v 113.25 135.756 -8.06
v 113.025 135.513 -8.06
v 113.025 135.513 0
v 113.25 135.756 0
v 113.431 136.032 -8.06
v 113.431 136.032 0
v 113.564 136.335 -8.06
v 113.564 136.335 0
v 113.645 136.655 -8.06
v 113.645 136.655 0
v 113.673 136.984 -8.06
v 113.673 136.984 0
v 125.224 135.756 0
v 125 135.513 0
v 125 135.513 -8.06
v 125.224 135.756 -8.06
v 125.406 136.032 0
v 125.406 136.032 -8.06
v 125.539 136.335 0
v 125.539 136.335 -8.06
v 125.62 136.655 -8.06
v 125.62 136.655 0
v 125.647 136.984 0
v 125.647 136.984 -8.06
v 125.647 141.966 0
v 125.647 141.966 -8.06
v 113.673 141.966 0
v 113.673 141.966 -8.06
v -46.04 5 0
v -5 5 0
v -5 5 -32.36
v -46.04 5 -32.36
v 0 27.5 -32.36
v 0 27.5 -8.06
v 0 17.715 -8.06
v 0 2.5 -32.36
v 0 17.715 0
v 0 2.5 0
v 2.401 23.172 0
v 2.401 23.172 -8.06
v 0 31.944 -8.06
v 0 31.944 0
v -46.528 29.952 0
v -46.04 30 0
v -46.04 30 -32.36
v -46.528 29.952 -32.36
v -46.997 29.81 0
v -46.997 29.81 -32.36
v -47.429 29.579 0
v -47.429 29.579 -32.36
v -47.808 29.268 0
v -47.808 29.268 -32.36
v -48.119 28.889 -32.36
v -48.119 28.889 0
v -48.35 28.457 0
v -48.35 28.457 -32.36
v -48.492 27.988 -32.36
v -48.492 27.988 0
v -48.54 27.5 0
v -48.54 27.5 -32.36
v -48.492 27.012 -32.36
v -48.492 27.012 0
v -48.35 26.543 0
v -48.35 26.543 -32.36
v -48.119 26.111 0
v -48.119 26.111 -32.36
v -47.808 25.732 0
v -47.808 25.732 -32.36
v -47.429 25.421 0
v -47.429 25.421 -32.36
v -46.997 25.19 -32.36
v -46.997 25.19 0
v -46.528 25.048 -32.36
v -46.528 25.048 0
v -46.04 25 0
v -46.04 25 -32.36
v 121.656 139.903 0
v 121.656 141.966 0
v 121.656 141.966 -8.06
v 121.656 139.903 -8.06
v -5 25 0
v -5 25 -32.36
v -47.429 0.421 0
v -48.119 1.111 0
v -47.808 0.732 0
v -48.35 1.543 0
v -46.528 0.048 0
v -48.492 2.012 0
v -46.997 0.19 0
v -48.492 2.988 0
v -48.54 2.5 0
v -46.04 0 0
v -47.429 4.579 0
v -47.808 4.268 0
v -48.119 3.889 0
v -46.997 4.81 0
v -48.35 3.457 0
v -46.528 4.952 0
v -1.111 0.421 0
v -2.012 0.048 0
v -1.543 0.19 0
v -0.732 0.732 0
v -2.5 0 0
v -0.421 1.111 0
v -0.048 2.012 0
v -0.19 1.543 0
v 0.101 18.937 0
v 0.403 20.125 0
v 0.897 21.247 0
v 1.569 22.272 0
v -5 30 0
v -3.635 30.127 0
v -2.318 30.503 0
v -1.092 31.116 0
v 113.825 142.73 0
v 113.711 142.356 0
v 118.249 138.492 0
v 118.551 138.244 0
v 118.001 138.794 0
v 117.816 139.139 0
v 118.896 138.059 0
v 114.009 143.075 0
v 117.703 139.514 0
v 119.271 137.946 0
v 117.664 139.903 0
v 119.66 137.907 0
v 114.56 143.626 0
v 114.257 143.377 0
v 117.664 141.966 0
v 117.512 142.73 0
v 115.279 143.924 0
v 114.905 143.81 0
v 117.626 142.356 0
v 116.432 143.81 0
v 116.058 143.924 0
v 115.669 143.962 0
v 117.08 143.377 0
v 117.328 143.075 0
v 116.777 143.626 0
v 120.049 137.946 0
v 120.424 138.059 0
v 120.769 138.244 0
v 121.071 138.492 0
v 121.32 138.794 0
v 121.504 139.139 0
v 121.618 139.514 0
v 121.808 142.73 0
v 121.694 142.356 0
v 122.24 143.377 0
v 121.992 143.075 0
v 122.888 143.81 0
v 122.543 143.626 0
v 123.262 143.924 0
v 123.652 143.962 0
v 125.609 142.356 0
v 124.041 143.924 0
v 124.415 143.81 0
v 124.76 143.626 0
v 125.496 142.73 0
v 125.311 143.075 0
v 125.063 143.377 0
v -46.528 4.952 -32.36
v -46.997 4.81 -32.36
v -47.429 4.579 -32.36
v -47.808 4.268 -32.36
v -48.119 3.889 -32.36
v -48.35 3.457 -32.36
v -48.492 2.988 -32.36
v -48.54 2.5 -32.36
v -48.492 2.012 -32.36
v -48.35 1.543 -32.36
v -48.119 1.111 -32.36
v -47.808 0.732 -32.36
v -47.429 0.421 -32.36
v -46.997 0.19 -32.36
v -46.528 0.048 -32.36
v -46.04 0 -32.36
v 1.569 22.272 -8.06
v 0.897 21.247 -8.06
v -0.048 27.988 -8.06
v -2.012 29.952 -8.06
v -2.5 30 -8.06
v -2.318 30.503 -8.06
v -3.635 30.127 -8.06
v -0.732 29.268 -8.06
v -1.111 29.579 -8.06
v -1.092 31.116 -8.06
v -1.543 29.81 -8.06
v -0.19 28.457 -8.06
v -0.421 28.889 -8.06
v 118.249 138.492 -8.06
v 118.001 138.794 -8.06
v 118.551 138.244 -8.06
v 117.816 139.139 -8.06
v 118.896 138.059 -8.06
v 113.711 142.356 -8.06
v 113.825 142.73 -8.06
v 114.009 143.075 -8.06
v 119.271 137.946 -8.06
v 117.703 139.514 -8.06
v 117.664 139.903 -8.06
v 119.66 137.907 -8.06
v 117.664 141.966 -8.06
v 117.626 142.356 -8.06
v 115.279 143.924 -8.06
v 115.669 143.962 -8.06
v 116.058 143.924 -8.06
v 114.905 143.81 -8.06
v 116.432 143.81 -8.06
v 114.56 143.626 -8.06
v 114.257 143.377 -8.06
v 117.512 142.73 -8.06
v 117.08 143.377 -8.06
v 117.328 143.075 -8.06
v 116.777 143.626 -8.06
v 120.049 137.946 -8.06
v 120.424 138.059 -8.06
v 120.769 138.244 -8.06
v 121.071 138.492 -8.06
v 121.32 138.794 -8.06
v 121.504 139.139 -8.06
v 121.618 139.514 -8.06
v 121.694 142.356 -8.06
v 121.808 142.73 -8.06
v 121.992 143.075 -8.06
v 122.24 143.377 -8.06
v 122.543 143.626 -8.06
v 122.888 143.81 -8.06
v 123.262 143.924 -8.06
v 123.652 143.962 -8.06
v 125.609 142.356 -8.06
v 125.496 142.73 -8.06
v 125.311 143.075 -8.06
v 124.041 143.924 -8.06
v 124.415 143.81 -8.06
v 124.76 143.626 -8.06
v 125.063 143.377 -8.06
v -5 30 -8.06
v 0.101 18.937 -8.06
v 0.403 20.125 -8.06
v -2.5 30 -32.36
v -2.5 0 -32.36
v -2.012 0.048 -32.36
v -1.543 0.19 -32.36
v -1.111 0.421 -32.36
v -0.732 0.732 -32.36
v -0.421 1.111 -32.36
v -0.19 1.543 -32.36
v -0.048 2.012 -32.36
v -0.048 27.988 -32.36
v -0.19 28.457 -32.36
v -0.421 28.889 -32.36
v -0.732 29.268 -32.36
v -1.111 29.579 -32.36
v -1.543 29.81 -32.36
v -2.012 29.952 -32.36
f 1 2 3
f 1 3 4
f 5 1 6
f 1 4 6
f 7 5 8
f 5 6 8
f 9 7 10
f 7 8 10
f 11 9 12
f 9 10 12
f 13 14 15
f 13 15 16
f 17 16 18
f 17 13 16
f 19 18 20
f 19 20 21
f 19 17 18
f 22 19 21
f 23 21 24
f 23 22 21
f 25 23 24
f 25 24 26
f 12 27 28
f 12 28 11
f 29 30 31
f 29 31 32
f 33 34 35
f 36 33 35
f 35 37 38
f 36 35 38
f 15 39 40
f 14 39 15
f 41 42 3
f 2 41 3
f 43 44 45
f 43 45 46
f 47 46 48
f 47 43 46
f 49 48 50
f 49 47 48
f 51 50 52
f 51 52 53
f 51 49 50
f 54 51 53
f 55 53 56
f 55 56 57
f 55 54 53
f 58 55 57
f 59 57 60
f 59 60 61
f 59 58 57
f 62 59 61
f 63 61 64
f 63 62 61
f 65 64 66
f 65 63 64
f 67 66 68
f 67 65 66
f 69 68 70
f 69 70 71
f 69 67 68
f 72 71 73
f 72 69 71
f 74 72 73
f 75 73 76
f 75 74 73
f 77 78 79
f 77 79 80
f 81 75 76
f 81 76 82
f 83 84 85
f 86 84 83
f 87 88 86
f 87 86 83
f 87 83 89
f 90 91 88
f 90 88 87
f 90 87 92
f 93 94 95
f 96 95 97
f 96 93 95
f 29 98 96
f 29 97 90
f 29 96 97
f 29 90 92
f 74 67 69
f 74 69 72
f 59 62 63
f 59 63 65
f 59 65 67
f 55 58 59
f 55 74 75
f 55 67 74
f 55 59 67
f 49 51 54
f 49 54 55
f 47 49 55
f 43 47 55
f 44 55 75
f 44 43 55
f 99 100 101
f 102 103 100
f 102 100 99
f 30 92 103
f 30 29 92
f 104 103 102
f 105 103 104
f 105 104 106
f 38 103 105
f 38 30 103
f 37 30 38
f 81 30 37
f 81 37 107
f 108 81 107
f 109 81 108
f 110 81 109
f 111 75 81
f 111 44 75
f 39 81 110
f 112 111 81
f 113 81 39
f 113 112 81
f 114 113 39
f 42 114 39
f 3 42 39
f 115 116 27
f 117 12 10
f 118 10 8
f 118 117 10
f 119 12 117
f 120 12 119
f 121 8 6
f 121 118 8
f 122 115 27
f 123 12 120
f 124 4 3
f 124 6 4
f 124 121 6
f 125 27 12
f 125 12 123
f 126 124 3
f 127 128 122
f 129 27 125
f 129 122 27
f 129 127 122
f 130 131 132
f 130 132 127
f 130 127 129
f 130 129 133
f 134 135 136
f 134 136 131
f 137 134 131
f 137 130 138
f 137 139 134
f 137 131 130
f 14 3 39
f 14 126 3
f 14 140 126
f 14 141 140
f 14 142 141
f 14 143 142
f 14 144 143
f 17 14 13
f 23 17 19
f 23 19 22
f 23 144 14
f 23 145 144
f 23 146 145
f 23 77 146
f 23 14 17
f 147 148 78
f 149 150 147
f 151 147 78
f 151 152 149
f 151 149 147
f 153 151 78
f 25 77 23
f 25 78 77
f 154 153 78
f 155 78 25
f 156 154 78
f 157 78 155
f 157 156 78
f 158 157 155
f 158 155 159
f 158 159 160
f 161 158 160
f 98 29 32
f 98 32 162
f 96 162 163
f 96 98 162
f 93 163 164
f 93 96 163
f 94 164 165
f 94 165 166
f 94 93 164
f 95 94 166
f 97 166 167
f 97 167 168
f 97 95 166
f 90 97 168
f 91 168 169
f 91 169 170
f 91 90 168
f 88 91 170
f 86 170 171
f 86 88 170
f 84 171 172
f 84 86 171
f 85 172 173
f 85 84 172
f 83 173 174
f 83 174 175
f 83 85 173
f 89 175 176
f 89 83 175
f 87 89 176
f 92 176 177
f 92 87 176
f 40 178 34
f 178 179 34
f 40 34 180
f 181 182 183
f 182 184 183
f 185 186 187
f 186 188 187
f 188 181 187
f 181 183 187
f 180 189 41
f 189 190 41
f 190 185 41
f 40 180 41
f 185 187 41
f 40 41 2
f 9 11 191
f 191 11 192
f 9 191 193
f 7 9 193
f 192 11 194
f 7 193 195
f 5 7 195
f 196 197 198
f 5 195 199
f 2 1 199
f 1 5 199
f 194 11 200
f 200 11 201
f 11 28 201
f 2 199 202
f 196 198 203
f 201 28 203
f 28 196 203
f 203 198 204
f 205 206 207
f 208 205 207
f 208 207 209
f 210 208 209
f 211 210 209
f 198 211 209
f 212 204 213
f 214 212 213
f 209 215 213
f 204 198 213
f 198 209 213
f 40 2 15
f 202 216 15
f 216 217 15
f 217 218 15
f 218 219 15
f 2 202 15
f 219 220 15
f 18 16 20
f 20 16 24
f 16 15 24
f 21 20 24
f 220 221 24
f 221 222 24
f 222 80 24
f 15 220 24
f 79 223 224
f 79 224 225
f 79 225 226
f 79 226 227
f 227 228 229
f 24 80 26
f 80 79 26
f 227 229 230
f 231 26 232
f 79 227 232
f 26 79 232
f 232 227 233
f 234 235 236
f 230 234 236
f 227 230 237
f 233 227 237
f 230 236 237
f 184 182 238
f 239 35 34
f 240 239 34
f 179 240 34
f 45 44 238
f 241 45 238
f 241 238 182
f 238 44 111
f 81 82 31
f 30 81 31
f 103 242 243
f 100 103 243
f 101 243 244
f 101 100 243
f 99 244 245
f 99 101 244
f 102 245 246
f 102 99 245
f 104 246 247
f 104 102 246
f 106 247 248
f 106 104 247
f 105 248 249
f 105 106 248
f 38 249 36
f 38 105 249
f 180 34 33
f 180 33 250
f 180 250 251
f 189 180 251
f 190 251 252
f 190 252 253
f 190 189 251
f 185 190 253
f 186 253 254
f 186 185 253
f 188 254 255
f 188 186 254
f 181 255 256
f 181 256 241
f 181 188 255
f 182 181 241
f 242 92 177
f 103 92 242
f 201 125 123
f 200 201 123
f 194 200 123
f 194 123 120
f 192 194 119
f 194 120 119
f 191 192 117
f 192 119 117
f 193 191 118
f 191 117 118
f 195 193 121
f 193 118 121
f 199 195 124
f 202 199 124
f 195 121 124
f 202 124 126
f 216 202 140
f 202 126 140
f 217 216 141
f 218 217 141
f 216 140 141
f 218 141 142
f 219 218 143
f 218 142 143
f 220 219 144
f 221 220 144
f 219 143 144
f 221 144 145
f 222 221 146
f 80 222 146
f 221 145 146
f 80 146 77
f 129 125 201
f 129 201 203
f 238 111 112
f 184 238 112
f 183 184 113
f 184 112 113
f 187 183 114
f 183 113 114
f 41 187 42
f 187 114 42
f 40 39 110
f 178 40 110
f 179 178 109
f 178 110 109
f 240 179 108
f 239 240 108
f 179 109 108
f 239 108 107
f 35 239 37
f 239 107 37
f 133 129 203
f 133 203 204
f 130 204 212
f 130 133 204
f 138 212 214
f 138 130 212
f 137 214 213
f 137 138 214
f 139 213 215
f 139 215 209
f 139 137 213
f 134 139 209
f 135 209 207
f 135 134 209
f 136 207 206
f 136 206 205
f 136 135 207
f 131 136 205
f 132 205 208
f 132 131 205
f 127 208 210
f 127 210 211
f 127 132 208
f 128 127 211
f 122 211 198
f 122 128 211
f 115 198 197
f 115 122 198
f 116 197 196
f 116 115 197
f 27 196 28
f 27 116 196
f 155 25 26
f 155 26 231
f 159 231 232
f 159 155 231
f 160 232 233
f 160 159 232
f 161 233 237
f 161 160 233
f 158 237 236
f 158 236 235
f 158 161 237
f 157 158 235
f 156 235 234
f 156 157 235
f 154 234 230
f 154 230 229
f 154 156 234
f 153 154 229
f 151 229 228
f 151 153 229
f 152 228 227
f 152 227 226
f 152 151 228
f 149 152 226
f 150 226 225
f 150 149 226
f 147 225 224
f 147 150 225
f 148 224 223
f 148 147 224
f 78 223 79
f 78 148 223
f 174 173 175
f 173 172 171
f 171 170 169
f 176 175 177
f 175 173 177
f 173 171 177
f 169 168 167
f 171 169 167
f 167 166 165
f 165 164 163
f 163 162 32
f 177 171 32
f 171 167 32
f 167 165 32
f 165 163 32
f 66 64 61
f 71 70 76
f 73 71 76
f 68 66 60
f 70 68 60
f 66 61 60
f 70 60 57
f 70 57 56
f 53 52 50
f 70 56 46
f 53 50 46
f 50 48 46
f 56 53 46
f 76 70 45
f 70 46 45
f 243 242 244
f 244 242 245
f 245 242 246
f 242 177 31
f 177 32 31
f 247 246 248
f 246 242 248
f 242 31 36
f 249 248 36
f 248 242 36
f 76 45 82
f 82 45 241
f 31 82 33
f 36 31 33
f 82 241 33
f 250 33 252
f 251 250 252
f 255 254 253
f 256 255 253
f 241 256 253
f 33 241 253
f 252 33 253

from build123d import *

# Parameters (mm, degrees)
EXTRUDE001_DEPTH = 32.36
EXTRUDE_DEPTH    = 8.06


with BuildPart() as extrude001:
    # Sketch001 → Extrude001 (new body)
    with BuildSketch(Plane.XY):
        with BuildLine():
            Line((-46.04, 25), (-5, 25))
            Line((-5, 25), (-5, 5))
            Line((-5, 5), (-46.04, 5))
            ThreePointArc((-46.04, 5), (-48.54, 2.5), (-46.04, 0))
            Line((-46.04, 0), (-2.5, 0))
            ThreePointArc((-2.5, 0), (-0.732233, 0.732233), (0, 2.5))
            Line((0, 27.5), (0, 2.5))
            ThreePointArc((0, 27.5), (-0.732233, 29.267767), (-2.5, 30))
            Line((-46.04, 30), (-2.5, 30))
            ThreePointArc((-46.04, 30), (-48.54, 27.5), (-46.04, 25))
        make_face()
    extrude(amount=-EXTRUDE001_DEPTH)


with BuildPart() as fusion:
    # Sketch → Extrude (new body)
    with BuildSketch(Plane.XY):
        with BuildLine():
            Line((-46.04, 25), (-5, 25))
            Line((-5, 25), (-5, 5))
            Line((-5, 5), (-46.04, 5))
            ThreePointArc((-46.04, 5), (-48.54, 2.5), (-46.04, 0))
            Line((-46.04, 0), (-2.5, 0))
            ThreePointArc((-2.5, 0), (-0.732233, 0.732233), (0, 2.5))
            Line((0, 17.715099), (0, 2.5))
            ThreePointArc((2.400936, 23.171642), (0.626774, 20.695802), (0, 17.715099))
            Line((2.400936, 23.171642), (125, 135.512986))
            ThreePointArc((125, 135.512986), (125.478432, 136.180638), (125.647452, 136.984434))
            Line((125.647452, 136.984434), (125.647452, 141.966204))
            ThreePointArc((125.647452, 141.966204), (123.651667, 143.96199), (121.655881, 141.966204))
            Line((121.655881, 141.966204), (121.655881, 139.903136))
            ThreePointArc((117.664309, 139.903136), (119.660095, 137.90735), (121.655881, 139.903136))
            Line((117.664309, 139.903136), (117.664309, 141.966204))
            ThreePointArc((117.664309, 141.966204), (115.668524, 143.96199), (113.672738, 141.966204))
            Line((113.672738, 141.966204), (113.672738, 136.984434))
            ThreePointArc((113.025285, 135.512986), (113.503718, 136.180638), (113.672738, 136.984434))
            Line((0, 31.944394), (113.025285, 135.512986))
            ThreePointArc((-5, 30), (-2.317619, 30.503205), (0, 31.944394))
            Line((-46.04, 30), (-5, 30))
            ThreePointArc((-46.04, 30), (-48.54, 27.5), (-46.04, 25))
        make_face()
    extrude(amount=-EXTRUDE_DEPTH)

    # Fusion: union Extrude001
    add(extrude001.part)


solid = fusion.part
